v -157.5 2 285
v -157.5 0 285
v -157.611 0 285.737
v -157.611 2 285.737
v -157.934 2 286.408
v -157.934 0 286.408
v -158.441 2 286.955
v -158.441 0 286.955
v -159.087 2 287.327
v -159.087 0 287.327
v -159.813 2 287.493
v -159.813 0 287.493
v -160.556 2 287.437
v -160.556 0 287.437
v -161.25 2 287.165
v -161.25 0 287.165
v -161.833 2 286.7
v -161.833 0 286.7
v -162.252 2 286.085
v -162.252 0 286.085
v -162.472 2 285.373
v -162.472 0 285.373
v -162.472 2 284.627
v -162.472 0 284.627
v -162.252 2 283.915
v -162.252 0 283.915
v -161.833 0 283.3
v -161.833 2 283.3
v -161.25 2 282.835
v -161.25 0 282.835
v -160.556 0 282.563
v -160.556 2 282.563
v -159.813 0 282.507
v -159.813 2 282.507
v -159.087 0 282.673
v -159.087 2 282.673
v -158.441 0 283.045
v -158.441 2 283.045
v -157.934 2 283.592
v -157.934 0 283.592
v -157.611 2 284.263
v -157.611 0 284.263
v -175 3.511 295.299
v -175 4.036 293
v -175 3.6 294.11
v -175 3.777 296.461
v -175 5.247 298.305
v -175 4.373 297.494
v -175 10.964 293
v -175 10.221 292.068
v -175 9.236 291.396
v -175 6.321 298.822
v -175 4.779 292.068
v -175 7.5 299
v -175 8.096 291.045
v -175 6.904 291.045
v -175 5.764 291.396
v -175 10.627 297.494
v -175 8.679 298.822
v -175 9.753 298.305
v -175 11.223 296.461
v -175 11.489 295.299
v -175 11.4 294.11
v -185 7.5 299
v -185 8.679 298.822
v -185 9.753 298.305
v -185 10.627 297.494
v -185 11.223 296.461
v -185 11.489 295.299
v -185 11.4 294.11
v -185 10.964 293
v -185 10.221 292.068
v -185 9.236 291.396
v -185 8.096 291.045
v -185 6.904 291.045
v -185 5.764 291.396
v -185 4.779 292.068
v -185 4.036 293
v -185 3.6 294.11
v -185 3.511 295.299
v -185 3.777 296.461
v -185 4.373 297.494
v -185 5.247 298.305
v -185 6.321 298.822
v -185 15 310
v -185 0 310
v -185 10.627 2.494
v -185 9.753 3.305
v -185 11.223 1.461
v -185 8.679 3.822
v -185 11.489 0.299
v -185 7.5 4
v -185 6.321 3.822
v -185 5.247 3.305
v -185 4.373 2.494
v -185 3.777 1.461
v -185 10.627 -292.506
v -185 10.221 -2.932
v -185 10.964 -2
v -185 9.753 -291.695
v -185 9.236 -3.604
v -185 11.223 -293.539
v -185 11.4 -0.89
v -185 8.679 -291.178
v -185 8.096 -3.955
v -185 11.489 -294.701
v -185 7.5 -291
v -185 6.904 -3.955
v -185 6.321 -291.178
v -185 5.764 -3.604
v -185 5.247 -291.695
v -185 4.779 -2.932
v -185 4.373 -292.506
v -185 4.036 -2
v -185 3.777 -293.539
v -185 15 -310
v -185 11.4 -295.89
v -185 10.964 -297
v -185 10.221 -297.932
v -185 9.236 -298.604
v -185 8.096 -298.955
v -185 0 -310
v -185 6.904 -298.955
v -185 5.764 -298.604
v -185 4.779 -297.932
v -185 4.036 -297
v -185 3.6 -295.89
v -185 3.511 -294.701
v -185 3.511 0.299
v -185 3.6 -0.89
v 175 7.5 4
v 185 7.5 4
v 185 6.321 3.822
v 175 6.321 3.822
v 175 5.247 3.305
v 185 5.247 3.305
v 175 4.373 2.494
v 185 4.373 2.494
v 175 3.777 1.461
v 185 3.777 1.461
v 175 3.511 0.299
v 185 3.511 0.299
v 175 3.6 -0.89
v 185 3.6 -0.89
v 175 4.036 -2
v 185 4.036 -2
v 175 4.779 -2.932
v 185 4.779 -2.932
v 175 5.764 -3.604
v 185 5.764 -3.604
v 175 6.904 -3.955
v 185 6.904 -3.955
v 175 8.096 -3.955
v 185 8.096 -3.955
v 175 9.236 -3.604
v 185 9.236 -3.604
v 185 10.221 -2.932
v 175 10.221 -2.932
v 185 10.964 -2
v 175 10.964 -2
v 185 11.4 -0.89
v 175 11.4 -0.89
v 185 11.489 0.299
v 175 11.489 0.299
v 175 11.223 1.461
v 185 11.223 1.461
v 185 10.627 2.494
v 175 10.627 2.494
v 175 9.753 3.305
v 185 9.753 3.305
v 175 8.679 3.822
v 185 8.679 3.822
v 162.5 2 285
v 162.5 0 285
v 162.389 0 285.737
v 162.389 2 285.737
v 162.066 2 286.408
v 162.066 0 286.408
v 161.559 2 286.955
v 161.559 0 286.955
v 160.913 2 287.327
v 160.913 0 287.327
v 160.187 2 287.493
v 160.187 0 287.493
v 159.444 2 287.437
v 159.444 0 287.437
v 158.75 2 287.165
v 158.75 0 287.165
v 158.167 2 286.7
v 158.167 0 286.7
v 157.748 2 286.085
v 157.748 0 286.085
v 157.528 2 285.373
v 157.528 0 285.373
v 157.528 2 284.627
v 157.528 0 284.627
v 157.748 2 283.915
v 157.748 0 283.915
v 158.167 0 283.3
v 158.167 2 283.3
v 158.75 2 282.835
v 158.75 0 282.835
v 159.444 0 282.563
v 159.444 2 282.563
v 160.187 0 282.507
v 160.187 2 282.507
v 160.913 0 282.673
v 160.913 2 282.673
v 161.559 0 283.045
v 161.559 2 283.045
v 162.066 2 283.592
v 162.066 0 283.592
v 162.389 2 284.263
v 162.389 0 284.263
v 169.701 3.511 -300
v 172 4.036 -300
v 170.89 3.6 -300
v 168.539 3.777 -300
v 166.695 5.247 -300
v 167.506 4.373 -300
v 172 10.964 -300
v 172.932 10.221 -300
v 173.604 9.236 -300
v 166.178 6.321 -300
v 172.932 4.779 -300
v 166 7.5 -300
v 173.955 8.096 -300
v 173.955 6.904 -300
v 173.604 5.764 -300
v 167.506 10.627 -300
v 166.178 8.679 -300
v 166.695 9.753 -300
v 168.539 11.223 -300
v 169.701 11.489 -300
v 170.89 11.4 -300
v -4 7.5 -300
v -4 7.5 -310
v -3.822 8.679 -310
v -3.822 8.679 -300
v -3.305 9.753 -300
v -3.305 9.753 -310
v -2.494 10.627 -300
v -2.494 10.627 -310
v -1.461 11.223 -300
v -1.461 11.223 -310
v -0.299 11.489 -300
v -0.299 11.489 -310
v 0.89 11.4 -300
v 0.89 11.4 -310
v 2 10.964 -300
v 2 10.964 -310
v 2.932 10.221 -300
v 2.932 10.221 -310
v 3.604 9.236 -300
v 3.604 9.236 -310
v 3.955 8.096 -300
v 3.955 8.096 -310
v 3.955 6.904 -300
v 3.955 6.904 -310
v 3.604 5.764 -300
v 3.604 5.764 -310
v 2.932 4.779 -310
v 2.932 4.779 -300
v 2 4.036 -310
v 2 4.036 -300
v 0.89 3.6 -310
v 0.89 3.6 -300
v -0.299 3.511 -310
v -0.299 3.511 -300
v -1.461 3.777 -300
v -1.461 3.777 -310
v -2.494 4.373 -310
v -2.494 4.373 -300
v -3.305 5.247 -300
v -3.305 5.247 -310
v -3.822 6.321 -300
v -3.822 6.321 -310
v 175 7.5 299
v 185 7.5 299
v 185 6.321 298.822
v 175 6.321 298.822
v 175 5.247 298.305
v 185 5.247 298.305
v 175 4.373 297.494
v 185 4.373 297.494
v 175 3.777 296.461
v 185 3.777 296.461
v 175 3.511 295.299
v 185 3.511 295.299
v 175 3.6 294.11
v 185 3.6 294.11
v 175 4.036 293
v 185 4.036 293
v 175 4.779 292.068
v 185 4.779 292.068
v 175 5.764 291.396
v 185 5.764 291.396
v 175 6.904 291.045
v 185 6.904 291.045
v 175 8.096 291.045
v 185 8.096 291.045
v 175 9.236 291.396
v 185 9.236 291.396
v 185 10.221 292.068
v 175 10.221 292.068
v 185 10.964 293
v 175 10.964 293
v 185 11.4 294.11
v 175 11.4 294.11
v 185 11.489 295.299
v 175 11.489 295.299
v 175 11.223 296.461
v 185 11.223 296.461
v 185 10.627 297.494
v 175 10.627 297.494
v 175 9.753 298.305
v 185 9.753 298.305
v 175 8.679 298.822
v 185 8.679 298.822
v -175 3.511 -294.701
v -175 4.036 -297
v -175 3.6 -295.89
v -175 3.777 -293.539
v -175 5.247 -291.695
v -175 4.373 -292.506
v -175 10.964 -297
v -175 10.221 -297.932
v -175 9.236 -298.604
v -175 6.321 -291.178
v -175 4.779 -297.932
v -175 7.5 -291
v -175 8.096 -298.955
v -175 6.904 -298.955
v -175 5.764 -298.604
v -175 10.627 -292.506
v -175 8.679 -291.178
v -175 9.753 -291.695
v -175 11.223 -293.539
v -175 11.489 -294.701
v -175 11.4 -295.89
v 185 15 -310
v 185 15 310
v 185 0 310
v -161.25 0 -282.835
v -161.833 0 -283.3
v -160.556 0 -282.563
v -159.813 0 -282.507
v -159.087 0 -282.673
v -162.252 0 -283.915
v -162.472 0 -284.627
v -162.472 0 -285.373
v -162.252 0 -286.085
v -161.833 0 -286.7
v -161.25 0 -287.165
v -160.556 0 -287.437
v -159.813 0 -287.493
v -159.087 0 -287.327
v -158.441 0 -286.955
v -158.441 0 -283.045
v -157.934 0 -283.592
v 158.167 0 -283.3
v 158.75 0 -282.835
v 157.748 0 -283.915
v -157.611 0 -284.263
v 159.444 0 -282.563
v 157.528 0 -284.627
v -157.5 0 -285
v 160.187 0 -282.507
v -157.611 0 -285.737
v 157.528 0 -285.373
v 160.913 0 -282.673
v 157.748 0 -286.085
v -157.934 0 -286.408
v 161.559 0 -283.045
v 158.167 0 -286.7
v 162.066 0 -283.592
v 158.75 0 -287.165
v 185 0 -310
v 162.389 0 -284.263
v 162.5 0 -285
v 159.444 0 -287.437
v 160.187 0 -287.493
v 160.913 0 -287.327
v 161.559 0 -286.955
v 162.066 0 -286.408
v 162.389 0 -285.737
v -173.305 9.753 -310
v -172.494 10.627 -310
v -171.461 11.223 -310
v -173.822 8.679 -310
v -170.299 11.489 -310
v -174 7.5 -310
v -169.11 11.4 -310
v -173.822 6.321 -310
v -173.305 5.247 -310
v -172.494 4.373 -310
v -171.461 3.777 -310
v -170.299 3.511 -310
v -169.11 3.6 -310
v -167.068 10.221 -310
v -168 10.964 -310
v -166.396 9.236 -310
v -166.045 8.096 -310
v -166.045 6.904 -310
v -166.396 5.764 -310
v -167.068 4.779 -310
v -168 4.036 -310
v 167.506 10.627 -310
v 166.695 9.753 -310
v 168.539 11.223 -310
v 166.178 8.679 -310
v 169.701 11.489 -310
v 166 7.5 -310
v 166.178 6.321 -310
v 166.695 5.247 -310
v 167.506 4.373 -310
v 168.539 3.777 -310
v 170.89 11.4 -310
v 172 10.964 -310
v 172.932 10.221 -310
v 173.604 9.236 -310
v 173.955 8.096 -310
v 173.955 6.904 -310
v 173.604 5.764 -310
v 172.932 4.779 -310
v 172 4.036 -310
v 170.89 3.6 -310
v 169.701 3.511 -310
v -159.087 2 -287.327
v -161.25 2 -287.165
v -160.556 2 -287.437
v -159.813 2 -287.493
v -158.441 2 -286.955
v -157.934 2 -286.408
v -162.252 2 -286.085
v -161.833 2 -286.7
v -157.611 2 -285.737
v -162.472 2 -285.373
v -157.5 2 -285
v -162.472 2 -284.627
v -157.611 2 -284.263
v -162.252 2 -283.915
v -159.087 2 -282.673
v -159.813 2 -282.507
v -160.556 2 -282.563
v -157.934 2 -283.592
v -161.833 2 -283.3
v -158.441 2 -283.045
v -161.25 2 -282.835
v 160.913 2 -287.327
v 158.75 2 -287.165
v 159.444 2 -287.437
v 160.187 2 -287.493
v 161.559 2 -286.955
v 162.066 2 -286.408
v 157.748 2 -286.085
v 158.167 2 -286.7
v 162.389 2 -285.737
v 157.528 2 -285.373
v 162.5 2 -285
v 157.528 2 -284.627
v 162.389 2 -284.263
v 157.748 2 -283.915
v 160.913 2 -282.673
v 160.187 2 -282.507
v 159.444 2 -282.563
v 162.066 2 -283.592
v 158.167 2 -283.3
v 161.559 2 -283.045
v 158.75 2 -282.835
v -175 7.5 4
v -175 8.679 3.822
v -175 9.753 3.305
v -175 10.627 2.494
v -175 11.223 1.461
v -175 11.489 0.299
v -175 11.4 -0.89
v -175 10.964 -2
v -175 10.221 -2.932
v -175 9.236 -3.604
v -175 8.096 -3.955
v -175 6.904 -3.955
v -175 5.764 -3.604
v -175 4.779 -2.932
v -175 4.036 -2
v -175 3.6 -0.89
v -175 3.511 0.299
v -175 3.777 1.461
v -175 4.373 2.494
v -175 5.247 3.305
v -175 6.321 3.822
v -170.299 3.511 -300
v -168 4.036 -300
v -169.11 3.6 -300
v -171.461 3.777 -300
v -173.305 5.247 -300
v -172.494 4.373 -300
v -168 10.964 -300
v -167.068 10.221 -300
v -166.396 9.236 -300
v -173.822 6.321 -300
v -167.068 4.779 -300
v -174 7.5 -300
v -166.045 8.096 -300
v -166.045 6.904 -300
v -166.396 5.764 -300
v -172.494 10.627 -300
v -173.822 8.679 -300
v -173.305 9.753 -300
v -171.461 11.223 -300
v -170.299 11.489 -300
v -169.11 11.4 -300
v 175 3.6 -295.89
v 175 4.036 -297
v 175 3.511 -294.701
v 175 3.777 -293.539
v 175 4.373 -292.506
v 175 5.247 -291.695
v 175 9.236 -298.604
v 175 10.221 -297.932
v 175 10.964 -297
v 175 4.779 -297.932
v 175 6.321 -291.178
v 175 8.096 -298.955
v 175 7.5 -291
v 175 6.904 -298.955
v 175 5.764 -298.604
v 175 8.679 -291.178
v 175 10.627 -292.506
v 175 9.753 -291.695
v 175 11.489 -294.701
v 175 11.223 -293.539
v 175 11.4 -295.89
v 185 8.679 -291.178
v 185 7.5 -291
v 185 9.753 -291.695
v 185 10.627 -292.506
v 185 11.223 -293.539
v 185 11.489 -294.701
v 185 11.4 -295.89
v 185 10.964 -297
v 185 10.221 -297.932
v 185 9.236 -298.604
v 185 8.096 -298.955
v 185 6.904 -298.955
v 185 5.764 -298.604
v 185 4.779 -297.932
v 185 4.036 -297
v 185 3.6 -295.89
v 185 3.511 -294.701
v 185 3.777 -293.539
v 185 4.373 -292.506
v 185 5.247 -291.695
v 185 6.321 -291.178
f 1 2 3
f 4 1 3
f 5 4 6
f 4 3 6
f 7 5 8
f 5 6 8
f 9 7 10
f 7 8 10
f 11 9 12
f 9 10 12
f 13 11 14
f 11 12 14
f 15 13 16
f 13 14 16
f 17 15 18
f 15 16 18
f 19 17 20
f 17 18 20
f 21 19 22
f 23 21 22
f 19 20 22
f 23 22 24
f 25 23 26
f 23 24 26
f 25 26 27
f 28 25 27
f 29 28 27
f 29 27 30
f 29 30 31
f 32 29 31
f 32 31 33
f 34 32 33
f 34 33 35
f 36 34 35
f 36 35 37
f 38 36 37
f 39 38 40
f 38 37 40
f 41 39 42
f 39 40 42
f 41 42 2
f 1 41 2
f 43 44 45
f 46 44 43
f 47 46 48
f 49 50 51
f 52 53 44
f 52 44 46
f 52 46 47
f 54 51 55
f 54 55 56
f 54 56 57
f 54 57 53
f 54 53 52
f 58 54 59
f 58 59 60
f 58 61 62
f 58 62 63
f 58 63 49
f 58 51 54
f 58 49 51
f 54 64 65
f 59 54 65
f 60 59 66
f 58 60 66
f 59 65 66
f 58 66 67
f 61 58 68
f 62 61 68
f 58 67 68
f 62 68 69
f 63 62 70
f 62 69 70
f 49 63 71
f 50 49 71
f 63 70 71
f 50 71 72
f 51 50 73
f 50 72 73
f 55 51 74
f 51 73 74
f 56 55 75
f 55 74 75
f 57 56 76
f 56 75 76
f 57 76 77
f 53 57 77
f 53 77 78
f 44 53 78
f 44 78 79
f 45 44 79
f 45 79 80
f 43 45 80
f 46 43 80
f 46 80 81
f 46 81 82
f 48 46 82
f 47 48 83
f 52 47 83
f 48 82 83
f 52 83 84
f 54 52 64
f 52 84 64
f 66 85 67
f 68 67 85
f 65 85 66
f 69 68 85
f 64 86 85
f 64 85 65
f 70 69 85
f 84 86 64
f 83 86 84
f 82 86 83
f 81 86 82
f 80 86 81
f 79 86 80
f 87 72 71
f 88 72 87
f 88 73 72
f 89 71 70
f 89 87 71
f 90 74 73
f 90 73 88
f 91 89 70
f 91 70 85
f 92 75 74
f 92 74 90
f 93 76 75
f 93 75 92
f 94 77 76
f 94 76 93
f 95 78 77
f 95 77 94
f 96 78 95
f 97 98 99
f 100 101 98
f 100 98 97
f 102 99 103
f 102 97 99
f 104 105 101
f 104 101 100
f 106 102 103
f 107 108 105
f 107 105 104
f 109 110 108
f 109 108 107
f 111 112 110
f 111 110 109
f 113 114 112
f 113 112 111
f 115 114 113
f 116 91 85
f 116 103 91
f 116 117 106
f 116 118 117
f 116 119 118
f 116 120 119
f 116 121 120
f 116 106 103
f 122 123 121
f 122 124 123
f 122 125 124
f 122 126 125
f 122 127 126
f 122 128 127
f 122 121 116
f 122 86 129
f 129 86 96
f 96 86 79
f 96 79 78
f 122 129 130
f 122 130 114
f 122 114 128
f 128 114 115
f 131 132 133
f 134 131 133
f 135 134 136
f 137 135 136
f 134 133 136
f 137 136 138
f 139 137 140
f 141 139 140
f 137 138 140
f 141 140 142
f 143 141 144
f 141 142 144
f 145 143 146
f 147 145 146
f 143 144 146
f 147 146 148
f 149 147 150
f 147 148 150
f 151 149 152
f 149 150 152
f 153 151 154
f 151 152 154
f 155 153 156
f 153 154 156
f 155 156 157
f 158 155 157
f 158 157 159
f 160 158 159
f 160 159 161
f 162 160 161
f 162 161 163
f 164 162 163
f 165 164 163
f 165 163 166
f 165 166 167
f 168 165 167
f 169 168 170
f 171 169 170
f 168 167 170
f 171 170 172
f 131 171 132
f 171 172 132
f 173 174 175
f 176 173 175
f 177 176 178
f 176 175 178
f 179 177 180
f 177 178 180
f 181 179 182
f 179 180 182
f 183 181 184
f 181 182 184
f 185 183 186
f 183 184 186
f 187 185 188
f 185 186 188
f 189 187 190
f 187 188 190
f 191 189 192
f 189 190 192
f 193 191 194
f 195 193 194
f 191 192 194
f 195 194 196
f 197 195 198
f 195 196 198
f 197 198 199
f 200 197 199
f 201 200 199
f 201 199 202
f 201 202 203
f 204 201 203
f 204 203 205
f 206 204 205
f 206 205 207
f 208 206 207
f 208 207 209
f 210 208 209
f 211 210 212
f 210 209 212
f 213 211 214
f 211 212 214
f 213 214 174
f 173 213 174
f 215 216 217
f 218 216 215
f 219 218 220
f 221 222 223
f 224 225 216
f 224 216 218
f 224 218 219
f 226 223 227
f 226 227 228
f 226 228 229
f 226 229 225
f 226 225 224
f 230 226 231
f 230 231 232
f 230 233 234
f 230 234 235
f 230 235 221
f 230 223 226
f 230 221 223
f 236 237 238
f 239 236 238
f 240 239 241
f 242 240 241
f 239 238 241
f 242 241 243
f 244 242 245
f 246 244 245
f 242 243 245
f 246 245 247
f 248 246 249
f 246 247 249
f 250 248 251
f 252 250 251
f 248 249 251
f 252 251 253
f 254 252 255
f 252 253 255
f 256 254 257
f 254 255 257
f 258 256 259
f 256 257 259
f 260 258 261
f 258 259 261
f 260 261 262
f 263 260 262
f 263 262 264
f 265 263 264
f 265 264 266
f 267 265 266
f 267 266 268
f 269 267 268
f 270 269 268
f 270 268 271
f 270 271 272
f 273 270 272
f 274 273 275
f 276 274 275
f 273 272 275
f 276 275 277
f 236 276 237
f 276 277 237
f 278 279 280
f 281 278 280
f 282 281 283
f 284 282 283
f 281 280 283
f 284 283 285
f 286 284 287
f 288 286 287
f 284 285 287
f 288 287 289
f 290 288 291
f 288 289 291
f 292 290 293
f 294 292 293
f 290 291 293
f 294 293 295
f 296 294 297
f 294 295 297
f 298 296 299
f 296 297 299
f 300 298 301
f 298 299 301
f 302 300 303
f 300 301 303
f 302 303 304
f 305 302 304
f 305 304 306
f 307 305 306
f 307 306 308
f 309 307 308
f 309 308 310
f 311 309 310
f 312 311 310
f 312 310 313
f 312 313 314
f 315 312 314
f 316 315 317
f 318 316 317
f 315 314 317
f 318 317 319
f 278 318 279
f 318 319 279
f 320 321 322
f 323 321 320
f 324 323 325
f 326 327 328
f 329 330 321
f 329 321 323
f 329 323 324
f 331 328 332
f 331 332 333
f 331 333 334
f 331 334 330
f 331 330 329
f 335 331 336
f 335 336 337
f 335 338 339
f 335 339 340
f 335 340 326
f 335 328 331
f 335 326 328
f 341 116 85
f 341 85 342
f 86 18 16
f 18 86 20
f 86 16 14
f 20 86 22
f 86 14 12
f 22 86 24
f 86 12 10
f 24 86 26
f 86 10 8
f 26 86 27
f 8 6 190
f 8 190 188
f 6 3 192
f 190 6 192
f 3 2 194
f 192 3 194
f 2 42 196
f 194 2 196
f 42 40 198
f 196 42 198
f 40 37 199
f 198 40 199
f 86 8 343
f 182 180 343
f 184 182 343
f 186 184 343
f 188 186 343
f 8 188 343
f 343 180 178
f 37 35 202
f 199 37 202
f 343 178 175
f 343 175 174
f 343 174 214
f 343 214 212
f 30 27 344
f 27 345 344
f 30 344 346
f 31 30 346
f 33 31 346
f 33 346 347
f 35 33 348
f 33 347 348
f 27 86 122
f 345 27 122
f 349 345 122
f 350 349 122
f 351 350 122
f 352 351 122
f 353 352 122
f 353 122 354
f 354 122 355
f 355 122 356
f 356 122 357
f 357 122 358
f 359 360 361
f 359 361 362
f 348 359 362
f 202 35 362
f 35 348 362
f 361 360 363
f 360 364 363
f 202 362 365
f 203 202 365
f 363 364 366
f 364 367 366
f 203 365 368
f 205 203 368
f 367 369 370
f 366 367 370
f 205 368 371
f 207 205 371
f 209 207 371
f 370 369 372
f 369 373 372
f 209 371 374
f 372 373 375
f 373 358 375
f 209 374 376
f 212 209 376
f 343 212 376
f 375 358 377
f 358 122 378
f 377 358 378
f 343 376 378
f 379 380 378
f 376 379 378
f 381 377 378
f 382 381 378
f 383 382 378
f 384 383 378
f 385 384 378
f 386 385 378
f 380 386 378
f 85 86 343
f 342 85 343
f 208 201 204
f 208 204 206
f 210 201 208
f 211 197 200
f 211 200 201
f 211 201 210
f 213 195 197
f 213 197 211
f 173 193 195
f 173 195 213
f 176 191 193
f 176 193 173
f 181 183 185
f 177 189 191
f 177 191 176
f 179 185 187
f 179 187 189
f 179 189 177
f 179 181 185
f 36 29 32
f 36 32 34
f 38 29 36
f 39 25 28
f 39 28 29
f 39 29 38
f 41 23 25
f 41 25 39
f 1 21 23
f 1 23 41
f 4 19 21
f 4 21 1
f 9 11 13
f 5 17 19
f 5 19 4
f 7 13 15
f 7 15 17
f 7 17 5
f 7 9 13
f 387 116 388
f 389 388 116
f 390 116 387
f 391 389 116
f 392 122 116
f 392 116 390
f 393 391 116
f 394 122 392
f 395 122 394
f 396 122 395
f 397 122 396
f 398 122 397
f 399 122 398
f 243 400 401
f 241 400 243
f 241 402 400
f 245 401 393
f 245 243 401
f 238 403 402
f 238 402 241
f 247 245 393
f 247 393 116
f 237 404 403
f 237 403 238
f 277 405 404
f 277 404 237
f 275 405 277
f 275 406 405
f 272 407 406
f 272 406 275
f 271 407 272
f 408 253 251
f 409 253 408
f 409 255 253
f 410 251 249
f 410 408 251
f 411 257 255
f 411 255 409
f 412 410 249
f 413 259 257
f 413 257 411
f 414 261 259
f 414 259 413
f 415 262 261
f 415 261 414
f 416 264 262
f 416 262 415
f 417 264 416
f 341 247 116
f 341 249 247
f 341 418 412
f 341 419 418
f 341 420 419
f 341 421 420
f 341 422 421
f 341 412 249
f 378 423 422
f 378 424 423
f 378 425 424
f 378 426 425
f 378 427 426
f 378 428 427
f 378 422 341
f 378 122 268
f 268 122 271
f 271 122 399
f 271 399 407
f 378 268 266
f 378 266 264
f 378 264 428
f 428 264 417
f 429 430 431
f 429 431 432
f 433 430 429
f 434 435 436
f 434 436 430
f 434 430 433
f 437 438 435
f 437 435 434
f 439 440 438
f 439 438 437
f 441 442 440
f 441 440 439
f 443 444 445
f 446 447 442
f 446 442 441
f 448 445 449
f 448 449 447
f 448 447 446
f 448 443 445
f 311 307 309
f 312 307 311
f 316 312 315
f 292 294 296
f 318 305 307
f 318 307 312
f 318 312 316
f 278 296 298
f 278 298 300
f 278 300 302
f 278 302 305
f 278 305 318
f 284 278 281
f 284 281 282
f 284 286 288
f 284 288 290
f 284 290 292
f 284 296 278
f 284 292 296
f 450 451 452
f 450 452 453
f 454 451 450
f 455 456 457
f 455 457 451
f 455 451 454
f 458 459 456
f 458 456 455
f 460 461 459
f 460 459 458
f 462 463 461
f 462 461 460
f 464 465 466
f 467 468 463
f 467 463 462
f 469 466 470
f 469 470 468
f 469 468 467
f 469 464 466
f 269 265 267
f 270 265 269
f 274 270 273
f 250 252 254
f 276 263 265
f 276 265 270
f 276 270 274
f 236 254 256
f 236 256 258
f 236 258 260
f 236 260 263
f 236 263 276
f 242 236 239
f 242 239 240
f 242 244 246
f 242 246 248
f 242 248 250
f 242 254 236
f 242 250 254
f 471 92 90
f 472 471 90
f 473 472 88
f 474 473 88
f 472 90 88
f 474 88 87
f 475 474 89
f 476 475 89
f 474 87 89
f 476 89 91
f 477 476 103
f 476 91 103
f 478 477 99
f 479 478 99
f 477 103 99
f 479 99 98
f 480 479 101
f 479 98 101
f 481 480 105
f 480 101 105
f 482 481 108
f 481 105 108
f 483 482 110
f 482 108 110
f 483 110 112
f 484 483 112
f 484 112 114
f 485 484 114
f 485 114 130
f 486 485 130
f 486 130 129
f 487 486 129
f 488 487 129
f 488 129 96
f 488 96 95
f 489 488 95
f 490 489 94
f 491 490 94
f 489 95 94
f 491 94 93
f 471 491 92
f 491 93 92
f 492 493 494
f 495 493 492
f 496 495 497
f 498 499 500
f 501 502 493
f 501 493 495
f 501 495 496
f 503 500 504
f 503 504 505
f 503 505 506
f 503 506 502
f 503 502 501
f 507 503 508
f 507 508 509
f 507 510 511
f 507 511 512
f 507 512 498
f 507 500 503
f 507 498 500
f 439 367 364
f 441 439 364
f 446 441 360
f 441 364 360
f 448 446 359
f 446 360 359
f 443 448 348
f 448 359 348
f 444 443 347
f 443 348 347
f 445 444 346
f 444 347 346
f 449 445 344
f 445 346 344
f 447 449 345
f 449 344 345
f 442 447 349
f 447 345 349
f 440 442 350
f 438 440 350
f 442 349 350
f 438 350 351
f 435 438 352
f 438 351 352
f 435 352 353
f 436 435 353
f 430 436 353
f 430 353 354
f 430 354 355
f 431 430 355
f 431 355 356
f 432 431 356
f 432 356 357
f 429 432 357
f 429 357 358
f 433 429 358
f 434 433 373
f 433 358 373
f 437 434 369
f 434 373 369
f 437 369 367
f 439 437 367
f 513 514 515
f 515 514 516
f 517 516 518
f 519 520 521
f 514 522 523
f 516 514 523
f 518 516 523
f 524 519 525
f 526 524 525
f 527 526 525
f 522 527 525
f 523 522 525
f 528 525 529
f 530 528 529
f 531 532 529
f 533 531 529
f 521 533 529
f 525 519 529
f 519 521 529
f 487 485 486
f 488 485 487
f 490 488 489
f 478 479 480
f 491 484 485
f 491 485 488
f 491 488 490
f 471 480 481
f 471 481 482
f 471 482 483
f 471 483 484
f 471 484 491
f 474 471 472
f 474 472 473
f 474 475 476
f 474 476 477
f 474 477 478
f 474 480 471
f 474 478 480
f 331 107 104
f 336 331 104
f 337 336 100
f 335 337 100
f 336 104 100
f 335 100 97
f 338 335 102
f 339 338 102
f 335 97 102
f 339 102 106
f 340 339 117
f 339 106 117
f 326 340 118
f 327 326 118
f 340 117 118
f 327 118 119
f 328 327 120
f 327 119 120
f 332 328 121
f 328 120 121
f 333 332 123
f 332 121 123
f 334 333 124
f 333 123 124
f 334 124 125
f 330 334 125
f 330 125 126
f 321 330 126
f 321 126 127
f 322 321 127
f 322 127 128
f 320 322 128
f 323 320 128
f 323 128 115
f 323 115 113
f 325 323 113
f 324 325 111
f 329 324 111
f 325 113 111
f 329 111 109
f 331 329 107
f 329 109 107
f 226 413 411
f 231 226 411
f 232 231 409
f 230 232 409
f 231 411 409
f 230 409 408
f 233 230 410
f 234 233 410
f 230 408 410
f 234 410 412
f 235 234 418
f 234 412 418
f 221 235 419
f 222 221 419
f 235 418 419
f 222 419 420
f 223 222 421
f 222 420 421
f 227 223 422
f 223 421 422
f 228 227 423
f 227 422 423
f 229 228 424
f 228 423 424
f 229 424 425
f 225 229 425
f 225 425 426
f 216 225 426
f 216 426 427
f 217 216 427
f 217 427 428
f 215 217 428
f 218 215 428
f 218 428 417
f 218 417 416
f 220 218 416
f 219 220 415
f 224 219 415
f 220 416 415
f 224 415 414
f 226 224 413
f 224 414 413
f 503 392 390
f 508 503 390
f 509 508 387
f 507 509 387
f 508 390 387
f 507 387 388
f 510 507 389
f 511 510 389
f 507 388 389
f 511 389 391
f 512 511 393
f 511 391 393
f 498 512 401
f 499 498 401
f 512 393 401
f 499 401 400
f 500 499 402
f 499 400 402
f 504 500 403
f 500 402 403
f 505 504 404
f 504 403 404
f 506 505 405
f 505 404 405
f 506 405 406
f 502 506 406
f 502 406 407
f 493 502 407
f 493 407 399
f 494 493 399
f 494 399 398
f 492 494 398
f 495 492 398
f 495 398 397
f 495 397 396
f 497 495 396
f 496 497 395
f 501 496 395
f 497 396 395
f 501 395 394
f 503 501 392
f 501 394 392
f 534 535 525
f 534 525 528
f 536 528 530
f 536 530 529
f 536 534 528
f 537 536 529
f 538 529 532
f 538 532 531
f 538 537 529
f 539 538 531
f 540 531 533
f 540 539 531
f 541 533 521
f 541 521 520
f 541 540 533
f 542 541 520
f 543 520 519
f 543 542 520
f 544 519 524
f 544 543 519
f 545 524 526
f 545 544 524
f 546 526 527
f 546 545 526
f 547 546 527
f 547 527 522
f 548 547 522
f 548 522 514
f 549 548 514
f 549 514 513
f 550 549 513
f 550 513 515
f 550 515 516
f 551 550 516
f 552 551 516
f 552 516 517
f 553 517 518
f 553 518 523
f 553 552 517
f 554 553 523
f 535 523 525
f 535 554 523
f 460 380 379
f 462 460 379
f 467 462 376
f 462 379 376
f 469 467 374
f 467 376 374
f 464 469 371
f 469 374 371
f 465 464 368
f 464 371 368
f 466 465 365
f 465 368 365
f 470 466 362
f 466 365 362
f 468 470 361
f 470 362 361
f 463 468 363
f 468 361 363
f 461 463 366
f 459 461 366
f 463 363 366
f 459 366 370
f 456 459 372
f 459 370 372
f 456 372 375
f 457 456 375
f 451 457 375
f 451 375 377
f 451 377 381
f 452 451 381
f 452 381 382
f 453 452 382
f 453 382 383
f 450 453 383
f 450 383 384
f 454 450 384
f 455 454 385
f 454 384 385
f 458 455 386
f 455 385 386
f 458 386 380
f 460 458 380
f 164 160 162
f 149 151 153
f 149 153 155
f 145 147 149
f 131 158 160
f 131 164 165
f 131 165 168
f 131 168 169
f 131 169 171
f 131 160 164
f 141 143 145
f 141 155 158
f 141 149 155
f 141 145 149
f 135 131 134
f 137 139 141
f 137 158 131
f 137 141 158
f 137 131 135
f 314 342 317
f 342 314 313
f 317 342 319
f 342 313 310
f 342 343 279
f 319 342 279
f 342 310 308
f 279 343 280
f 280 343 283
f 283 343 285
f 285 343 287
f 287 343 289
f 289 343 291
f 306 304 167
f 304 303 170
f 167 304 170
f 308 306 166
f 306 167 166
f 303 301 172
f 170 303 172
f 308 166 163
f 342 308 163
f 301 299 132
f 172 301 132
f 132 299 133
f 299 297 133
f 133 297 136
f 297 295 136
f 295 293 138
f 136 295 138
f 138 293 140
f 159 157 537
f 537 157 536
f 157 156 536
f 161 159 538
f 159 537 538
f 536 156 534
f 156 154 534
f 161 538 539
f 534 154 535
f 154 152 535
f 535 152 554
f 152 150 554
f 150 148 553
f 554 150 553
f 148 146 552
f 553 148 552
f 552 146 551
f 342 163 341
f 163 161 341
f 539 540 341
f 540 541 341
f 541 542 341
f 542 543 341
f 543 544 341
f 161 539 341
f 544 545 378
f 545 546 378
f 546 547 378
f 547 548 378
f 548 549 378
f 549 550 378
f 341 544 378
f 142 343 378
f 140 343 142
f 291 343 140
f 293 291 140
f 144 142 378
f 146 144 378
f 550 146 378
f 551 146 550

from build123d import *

# Parameters (mm, degrees)
SKETCH1_W               = 370
SKETCH1_H               = 620
BOSS_EXTRUDE1_DEPTH     = 15
SKETCH2_R               = 2.5
CUT_EXTRUDE1_DEPTH      = 2
SKETCH5_R               = 4
CUT_EXTRUDE2_DEPTH      = 10
LPATTERN1_COUNT         = 3
LPATTERN1_PITCH         = 295
MIRROR1_COPY_1_SKETCH_R = 4
MIRROR1_COPY_1_DEPTH    = 10
MIRROR1_COPY_2_SKETCH_R = 4
MIRROR1_COPY_2_DEPTH    = 10
SKETCH6_R               = 4
CUT_EXTRUDE4_DEPTH      = 10
LPATTERN2_COUNT         = 3
LPATTERN2_PITCH         = 170


with BuildPart() as part:
    # Sketch1 → Boss-Extrude1 (new body)
    with BuildSketch(Plane(origin=(0, 0, 0), x_dir=(1, 0, 0), z_dir=(0, 1, 0))):
        Rectangle(SKETCH1_W, SKETCH1_H)
    extrude(amount=BOSS_EXTRUDE1_DEPTH)

    # Sketch2 → Cut-Extrude1 (cut)
    with BuildSketch(Plane.XZ):
        with Locations((160, 285)):
            Circle(SKETCH2_R)
        with Locations((-160, 285)):
            Circle(SKETCH2_R)
        with Locations((-160, -285)):
            Circle(SKETCH2_R)
        with Locations((160, -285)):
            Circle(SKETCH2_R)
    extrude(amount=-CUT_EXTRUDE1_DEPTH, mode=Mode.SUBTRACT)

    # Sketch5 → Cut-Extrude2 (cut)
    with BuildSketch(Plane.ZY.offset(185)):
        with Locations((-295, 7.5)):
            Circle(SKETCH5_R)
    cut_extrude2 = extrude(amount=-CUT_EXTRUDE2_DEPTH, mode=Mode.SUBTRACT)

    # LPattern1: Cut-Extrude2 ×3
    with Locations(*[(0, 0, i * LPATTERN1_PITCH) for i in range(1, LPATTERN1_COUNT)]):
        add(cut_extrude2, mode=Mode.SUBTRACT)

    # Mirror1: Cut-Extrude2 across plane
    add(cut_extrude2.mirror(Plane(origin=(0, 0, 0), x_dir=(0, 0, 1), z_dir=(1, 0, 0))), mode=Mode.SUBTRACT)

    # Mirror1 copy 1 sketch → Mirror1 copy 1 (cut)
    with BuildSketch(Plane(origin=(185, 0, 295), x_dir=(0, 0, 1), z_dir=(1, 0, 0))):
        with Locations((-295, -7.5)):
            Circle(MIRROR1_COPY_1_SKETCH_R)
    extrude(amount=-MIRROR1_COPY_1_DEPTH, mode=Mode.SUBTRACT)

    # Mirror1 copy 2 sketch → Mirror1 copy 2 (cut)
    with BuildSketch(Plane(origin=(185, 0, 590), x_dir=(0, 0, 1), z_dir=(1, 0, 0))):
        with Locations((-295, -7.5)):
            Circle(MIRROR1_COPY_2_SKETCH_R)
    extrude(amount=-MIRROR1_COPY_2_DEPTH, mode=Mode.SUBTRACT)

    # Sketch6 → Cut-Extrude4 (cut)
    with BuildSketch(Plane(origin=(0, 0, -310), x_dir=(-1, 0, 0), z_dir=(0, 0, -1))):
        with Locations((-170, 7.5)):
            Circle(SKETCH6_R)
    cut_extrude4 = extrude(amount=-CUT_EXTRUDE4_DEPTH, mode=Mode.SUBTRACT)

    # LPattern2: Cut-Extrude4 ×3
    with Locations(*[(-i * LPATTERN2_PITCH, 0, 0) for i in range(1, LPATTERN2_COUNT)]):
        add(cut_extrude4, mode=Mode.SUBTRACT)


solid = part.part
